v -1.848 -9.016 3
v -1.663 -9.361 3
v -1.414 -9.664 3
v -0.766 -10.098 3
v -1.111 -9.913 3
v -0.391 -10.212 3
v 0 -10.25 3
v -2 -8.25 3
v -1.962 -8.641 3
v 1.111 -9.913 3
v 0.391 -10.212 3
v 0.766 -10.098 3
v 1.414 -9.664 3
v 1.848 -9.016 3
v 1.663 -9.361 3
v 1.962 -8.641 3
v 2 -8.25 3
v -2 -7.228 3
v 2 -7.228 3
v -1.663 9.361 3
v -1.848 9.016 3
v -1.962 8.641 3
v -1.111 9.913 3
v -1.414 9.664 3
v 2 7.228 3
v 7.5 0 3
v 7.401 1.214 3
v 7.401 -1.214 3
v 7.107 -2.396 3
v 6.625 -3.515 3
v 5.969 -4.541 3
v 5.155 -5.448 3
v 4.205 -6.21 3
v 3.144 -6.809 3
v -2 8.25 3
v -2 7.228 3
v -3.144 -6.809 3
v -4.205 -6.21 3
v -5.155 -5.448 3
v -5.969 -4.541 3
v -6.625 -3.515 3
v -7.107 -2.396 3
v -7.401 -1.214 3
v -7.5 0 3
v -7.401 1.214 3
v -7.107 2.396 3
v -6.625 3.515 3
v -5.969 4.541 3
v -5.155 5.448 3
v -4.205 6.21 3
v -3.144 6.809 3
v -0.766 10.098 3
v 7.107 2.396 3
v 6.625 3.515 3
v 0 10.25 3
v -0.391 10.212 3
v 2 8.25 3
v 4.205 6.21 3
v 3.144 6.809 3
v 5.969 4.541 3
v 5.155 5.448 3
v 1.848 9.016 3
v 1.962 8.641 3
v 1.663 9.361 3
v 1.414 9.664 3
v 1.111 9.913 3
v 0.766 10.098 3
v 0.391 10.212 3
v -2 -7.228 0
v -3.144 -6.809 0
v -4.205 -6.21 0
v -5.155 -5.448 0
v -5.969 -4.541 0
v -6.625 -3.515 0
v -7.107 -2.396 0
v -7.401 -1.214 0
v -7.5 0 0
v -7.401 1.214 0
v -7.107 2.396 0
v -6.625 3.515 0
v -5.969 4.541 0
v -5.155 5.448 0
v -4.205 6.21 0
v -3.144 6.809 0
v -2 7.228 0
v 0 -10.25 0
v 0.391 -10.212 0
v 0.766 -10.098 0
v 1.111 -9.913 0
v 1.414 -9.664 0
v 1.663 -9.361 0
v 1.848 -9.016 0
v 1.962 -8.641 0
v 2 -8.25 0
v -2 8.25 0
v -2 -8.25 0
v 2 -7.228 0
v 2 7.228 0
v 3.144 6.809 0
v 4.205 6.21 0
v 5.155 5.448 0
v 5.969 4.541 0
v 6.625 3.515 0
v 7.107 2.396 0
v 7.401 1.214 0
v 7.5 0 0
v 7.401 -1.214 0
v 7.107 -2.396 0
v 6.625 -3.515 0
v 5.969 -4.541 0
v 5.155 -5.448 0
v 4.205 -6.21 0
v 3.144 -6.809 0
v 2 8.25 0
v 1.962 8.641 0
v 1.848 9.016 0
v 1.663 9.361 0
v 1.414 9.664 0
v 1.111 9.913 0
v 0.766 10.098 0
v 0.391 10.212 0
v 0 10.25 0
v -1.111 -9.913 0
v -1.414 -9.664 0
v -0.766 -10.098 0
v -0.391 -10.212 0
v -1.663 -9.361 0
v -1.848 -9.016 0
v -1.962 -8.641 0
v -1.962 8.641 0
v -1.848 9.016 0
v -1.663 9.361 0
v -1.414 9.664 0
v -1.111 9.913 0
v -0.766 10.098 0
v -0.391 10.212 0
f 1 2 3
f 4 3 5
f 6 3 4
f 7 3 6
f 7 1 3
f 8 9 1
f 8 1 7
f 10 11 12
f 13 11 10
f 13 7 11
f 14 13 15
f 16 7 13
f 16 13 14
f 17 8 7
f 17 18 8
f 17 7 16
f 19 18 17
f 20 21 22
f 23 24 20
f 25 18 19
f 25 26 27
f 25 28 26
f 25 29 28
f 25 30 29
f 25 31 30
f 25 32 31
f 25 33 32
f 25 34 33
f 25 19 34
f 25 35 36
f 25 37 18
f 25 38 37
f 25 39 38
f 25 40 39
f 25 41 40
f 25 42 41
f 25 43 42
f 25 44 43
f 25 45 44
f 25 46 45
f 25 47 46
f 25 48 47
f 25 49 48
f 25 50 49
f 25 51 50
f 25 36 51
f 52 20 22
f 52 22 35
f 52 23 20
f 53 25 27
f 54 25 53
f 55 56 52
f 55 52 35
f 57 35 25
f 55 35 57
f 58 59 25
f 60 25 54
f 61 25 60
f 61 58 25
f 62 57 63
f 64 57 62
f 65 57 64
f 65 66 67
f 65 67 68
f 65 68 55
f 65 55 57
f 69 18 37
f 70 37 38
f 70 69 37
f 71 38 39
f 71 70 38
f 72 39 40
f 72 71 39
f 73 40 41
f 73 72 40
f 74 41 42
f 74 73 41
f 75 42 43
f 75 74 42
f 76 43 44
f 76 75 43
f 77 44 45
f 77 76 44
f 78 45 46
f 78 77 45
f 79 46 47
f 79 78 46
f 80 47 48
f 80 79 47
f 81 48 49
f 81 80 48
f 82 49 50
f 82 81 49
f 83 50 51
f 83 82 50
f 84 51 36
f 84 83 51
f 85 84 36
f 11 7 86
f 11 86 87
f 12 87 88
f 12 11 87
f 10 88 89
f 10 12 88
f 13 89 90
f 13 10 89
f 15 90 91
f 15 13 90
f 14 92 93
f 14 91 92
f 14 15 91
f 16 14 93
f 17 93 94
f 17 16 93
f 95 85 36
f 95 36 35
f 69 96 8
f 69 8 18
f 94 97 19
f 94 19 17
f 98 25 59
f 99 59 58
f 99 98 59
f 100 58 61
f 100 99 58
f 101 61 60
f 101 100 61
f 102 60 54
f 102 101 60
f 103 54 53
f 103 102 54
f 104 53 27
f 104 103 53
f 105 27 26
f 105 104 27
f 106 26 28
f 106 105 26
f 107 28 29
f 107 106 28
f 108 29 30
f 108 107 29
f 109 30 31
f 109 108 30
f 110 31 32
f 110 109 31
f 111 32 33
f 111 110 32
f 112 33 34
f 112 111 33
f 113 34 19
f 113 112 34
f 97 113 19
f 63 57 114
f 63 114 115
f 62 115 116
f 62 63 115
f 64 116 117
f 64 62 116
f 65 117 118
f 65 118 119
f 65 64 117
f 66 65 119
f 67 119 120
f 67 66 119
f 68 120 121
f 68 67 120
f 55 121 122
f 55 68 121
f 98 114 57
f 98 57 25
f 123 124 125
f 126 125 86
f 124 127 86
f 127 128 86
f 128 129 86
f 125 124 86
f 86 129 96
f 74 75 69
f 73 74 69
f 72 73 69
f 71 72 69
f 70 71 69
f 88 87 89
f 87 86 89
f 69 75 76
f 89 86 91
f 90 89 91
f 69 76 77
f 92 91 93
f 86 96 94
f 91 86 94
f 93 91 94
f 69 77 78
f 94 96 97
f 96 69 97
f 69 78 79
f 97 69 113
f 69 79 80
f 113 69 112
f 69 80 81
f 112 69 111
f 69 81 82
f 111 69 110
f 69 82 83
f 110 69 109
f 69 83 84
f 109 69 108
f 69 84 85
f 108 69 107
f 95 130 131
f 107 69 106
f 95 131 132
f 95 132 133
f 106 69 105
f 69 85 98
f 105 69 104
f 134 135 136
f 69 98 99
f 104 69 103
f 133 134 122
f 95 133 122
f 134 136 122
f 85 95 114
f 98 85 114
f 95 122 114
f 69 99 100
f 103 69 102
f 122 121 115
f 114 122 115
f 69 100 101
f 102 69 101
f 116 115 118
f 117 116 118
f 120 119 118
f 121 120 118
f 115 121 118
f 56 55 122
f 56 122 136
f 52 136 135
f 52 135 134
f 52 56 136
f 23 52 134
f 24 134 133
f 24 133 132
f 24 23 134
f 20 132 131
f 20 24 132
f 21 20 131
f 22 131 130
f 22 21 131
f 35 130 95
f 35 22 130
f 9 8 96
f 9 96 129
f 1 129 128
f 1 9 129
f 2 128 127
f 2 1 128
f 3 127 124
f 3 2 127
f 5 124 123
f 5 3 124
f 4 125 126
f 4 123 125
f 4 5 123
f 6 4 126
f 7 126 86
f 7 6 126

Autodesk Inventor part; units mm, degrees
ref_plane "YZ Plane" through (0, 0, 0) normal (1, 0, 0) x (0, 1, 0)
ref_plane "XZ Plane" through (0, 0, 0) normal (0, 1, 0) x (-1, 0, 0)
ref_plane "XY Plane" through (0, 0, 0) normal (0, 0, 1) x (1, 0, 0)
sketch "Sketch1" plane through (0, 0, 0) normal (0, 0, 1) x (1, 0, 0)
  circle A0 centre (0, 0) radius 7.5
  line L0 (2, -2.25) -> (2, -10.25)
  line L1 (2, -10.25) -> (-2, -10.25)
  line L2 (-2, -10.25) -> (-2, -2.25)
  point P0 (0, 0)
  point P1 (0, 0)
  point P2 (-2, -7.2284)
  point P3 (2, -7.2284)
extrude "Extrusion1" add sketch "Sketch1" along normal blind 3
fillet "Fillet1" radius 2 2 edges at (2, -10.25, 1.5) (-2, -10.25, 1.5)
mirror "Mirror1" about plane through (0, 0, 0) normal (0, 1, 0)
properties part number "try"
